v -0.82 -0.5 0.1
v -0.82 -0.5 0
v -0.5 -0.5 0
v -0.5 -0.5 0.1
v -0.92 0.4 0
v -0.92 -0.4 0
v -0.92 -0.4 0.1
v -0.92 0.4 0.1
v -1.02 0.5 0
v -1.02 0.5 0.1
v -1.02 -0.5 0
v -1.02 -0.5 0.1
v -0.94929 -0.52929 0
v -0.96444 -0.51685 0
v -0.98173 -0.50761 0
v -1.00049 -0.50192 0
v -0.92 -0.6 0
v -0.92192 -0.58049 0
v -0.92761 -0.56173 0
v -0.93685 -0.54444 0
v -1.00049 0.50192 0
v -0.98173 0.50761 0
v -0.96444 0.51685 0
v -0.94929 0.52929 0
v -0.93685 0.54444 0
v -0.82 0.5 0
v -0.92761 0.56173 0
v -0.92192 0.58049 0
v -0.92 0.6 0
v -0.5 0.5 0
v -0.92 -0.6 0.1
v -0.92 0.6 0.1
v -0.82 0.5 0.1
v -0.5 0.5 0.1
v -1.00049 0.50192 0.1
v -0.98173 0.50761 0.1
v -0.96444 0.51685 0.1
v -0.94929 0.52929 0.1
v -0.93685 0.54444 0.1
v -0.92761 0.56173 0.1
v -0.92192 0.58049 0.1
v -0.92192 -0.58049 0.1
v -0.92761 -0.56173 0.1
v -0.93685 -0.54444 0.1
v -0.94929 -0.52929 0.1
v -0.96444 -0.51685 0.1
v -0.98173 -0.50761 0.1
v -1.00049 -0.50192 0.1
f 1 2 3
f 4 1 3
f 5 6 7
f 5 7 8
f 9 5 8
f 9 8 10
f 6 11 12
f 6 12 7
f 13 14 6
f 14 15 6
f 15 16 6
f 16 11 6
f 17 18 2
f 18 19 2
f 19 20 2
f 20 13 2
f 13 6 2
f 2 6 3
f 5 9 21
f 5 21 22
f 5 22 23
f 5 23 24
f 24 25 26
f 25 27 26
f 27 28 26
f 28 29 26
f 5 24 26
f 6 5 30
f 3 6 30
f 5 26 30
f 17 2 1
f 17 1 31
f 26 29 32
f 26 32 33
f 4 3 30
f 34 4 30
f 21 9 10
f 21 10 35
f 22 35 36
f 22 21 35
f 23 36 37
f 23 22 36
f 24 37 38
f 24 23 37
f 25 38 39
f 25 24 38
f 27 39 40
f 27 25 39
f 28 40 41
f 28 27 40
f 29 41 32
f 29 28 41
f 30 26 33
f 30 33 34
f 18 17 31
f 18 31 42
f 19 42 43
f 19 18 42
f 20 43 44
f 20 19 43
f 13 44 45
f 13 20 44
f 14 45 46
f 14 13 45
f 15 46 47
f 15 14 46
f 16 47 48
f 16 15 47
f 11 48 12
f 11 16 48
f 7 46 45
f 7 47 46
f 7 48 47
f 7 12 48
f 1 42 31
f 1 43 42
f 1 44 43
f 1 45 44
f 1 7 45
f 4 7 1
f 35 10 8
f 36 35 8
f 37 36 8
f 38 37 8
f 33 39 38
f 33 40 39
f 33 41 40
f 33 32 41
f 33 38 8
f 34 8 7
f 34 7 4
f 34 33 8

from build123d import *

# Parameters (mm, degrees)
PAD_DEPTH = 0.1


with BuildPart() as part:
    # Sketch → Pad (new body)
    with BuildSketch(Plane.XY):
        with BuildLine():
            Line((-0.5, 0.4), (-0.5, -0.4))
            Line((-0.5, -0.5), (-0.5, -0.4))
            Line((-0.6, -0.5), (-0.5, -0.5))
            Line((-0.6, -0.5), (-0.82, -0.5))
            Line((-0.82, -0.5), (-0.92, -0.6))
            ThreePointArc((-0.92, -0.6), (-0.949289, -0.529289), (-1.02, -0.5))
            Line((-1.02, -0.5), (-0.92, -0.4))
            Line((-0.92, -0.4), (-0.92, 0.4))
            Line((-0.92, 0.4), (-1.02, 0.5))
            ThreePointArc((-1.02, 0.5), (-0.949289, 0.529289), (-0.92, 0.6))
            Line((-0.92, 0.6), (-0.82, 0.5))
            Line((-0.82, 0.5), (-0.6, 0.5))
            Line((-0.6, 0.5), (-0.5, 0.5))
            Line((-0.5, 0.5), (-0.5, 0.4))
        make_face()
    extrude(amount=PAD_DEPTH)


solid = part.part
